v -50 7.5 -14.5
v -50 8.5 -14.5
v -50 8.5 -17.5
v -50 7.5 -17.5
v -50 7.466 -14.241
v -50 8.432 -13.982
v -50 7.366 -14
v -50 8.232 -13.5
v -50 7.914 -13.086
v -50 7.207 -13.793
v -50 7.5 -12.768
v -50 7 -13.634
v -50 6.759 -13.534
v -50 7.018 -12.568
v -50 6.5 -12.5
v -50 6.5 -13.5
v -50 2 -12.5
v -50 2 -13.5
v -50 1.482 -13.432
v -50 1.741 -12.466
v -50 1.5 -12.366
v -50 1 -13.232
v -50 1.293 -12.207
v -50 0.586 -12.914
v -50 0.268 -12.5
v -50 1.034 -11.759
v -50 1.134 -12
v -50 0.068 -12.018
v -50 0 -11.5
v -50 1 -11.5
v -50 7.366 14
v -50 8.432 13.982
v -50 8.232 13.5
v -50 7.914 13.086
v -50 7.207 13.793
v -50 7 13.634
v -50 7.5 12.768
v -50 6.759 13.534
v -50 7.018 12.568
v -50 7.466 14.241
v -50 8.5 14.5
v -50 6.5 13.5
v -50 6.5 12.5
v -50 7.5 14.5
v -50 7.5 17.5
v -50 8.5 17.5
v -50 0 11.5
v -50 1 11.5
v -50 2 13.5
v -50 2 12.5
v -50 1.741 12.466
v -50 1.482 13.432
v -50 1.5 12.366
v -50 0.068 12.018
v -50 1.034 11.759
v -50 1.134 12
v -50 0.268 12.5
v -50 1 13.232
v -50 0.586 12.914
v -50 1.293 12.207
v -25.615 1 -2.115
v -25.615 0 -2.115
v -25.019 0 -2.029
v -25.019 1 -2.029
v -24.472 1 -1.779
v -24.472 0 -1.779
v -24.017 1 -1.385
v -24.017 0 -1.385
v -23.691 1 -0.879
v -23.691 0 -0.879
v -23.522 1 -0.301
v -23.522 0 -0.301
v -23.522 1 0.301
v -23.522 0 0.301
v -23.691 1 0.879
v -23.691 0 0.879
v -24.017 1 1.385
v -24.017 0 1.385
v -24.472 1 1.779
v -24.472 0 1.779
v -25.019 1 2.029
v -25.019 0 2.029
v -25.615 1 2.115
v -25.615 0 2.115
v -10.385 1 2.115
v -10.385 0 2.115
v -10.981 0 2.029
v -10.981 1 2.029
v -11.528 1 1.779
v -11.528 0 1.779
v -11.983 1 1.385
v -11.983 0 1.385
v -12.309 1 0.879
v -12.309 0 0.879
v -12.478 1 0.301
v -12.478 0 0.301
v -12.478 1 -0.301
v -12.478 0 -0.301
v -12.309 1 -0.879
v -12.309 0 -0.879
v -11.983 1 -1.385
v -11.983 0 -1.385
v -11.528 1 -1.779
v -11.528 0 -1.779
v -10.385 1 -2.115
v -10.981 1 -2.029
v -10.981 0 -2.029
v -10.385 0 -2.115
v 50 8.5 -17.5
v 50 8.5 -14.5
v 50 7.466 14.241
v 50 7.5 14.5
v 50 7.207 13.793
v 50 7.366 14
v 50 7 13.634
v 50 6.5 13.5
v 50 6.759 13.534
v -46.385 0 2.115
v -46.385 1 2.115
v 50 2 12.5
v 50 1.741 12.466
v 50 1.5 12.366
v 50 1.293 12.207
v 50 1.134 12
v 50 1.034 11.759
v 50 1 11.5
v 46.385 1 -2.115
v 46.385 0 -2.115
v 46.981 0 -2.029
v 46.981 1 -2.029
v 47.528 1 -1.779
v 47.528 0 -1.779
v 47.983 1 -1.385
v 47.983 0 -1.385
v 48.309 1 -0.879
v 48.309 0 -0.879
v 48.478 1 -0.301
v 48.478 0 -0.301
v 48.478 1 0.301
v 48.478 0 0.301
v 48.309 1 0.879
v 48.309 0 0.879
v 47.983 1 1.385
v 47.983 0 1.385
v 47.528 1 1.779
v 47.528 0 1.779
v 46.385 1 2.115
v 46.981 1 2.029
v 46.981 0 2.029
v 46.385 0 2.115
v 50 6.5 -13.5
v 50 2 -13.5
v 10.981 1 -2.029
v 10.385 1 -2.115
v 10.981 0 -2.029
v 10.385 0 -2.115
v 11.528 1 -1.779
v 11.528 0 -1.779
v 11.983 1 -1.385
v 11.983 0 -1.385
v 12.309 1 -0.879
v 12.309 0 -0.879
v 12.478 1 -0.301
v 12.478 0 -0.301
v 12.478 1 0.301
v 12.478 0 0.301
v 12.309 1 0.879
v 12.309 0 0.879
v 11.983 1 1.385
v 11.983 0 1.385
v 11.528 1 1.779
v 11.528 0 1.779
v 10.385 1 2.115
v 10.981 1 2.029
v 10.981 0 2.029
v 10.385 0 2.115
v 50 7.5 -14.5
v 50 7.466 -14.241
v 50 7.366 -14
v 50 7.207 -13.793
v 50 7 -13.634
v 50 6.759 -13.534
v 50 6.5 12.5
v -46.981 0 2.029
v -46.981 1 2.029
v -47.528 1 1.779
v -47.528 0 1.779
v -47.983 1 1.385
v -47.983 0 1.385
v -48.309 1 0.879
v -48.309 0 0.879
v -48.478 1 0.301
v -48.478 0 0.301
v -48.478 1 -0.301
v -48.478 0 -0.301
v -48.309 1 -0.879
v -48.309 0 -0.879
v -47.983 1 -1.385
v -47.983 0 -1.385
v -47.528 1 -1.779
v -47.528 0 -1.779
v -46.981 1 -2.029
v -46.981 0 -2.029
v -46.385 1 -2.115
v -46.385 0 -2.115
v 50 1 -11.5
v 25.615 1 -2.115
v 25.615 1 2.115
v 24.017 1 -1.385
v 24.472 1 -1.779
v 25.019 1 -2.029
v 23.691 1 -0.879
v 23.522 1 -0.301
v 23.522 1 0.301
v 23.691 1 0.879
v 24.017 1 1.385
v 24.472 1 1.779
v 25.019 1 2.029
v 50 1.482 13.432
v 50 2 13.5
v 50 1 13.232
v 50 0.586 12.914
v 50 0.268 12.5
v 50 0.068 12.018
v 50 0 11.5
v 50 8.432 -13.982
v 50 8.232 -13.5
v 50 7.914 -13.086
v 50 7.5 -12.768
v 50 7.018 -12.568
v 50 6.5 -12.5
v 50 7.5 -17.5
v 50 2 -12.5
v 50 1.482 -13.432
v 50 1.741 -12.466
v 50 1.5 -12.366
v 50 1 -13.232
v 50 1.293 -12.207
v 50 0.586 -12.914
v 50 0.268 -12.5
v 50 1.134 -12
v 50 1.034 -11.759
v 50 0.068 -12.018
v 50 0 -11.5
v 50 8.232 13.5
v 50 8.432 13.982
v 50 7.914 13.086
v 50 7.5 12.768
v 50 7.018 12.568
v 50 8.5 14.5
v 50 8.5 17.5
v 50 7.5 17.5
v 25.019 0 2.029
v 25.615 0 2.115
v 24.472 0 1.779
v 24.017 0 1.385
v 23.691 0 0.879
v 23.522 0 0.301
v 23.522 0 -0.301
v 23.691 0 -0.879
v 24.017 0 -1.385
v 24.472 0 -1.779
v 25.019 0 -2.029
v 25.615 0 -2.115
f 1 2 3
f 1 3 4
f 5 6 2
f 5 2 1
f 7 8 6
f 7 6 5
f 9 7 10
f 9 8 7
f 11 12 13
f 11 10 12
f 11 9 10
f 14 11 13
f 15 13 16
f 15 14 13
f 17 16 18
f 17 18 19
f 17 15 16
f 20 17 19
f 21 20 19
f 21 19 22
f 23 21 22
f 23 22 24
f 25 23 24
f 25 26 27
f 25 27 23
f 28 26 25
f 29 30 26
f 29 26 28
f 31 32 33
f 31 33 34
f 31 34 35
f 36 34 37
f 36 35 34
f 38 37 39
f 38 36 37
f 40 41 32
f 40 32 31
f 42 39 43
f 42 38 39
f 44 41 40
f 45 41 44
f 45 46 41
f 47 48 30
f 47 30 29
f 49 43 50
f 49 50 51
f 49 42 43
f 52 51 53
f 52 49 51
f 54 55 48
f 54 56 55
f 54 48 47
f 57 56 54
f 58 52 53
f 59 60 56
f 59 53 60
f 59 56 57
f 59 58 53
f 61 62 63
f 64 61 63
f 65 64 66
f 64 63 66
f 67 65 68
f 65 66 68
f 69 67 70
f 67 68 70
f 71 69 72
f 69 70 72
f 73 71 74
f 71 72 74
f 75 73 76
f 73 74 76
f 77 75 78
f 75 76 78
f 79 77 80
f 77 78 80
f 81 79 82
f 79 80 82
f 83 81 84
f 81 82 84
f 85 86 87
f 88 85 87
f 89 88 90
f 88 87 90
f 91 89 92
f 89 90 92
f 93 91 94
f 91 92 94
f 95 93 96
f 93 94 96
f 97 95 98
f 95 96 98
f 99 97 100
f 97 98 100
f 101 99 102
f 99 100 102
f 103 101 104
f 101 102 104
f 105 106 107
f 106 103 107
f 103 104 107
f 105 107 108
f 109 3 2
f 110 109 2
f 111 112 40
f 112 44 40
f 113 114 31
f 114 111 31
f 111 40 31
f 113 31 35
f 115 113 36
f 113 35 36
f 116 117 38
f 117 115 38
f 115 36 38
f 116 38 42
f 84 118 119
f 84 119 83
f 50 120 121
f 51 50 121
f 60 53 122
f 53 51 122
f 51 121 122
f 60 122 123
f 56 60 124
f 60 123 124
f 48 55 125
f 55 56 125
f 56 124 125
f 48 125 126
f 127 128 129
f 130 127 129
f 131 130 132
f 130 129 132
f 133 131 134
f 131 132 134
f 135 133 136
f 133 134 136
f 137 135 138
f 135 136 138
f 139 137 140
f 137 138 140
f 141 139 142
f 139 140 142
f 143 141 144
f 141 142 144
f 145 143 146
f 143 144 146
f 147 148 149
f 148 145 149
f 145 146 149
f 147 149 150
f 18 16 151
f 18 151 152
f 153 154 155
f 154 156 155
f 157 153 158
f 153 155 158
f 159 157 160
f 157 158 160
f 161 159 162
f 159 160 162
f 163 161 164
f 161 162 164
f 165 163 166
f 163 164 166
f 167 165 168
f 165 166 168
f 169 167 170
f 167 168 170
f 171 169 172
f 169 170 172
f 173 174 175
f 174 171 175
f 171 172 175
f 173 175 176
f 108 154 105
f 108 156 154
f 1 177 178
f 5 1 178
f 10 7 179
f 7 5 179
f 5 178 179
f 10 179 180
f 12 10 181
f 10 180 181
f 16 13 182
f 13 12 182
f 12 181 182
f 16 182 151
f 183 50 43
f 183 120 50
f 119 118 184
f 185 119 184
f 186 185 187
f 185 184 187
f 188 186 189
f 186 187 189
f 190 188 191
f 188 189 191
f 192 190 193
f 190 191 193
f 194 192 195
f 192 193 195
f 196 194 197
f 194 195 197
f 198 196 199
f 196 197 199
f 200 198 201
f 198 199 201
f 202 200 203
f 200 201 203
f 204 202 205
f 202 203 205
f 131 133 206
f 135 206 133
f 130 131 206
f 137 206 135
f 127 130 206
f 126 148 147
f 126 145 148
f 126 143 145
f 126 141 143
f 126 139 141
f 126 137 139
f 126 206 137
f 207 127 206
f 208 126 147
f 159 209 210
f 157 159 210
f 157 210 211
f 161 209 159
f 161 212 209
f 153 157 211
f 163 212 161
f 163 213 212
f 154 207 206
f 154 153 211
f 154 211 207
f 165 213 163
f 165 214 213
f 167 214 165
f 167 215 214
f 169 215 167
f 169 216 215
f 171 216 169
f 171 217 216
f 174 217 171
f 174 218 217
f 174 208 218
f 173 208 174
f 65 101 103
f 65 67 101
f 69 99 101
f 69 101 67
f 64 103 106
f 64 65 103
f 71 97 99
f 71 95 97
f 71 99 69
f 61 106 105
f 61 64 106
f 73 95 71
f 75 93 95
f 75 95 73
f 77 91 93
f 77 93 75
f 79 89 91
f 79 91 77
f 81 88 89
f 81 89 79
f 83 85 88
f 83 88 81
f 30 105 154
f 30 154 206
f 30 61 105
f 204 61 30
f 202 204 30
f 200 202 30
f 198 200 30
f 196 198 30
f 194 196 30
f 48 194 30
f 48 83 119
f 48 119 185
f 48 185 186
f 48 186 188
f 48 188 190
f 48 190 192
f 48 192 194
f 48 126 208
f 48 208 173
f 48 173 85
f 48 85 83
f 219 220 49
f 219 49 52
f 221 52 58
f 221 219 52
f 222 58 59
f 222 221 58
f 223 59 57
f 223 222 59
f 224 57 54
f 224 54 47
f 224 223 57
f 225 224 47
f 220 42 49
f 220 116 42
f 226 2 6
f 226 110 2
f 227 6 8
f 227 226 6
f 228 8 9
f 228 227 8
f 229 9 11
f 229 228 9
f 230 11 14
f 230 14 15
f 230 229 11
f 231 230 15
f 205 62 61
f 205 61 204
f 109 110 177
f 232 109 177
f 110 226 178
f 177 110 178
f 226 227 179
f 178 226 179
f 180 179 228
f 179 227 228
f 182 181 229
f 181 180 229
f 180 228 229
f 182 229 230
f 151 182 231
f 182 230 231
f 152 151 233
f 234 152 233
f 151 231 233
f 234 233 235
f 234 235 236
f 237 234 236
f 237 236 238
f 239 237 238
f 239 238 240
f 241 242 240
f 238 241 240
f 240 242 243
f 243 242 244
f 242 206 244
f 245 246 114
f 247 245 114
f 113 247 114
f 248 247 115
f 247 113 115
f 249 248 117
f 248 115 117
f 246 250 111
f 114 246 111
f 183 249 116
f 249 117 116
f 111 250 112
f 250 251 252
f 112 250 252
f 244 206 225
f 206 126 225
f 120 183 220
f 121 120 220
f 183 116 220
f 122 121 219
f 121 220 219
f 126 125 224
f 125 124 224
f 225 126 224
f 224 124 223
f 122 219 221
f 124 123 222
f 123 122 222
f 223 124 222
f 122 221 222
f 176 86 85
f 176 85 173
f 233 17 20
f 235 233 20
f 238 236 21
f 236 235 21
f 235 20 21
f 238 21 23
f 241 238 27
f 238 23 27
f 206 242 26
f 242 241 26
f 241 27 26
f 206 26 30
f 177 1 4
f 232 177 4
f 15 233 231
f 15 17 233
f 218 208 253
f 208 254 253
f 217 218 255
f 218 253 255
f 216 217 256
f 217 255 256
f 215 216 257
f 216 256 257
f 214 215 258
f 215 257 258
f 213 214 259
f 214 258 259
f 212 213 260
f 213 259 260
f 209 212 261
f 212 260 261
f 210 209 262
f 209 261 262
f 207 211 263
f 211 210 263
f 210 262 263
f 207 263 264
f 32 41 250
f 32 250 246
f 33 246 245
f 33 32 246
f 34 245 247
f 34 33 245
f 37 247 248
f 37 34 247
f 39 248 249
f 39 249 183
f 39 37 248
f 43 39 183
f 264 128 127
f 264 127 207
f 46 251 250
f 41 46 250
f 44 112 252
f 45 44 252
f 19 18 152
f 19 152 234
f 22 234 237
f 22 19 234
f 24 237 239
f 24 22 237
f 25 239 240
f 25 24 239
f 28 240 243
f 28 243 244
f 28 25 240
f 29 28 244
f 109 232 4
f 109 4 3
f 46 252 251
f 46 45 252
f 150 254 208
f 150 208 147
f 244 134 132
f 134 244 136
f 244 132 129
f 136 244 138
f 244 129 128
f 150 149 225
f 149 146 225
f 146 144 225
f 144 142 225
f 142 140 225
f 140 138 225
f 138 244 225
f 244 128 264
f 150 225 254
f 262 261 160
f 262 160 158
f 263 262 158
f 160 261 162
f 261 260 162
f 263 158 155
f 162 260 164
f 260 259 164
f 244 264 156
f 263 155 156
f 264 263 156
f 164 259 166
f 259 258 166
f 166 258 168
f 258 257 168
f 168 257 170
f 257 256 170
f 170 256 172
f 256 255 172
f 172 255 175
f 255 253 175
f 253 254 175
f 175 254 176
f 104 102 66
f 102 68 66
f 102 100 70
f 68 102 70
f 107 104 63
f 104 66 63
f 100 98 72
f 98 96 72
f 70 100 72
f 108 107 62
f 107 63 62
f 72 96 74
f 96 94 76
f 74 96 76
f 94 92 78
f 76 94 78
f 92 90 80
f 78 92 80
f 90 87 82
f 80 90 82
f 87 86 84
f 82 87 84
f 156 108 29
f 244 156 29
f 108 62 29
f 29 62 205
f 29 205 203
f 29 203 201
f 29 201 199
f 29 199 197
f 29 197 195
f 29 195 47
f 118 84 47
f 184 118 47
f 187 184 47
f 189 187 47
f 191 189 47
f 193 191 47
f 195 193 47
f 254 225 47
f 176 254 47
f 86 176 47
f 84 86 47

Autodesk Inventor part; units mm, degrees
ref_plane "YZ Plane" through (0, 0, 0) normal (1, 0, 0) x (0, 1, 0)
ref_plane "XZ Plane" through (0, 0, 0) normal (0, 1, 0) x (-1, 0, 0)
ref_plane "XY Plane" through (0, 0, 0) normal (0, 0, 1) x (1, 0, 0)
sketch "Base Pattern" plane through (0, 0, 0) normal (0, 1, 0) x (-1, 0, 0)
  line L0 (50, 13.5) -> (-50, 13.5)
  line L1 (-50, 13.5) -> (-50, -13.5)
  line L2 (-50, -13.5) -> (50, -13.5)
  line L3 (50, -13.5) -> (50, 13.5)
  line L4 (50, 13.5) -> (-50, -13.5) construction
  line L5 (-50, 13.5) -> (50, -13.5) construction
  point P0 (0, 0)
  dimension "Length" = 100
  dimension "Base_Width" = 27
sketch "Slot Pattern Set-Out" plane through (0, 0, 0) normal (0, 1, 0) x (-1, 0, 0)
  line L0 (0, -25) -> (0, 25)
  line L1 (10.385, 2.115) -> (-10.385, 2.115)
  line L2 (-10.385, -2.115) -> (10.385, -2.115)
  arc A0 (10.385, -2.115) -> (10.385, 2.115) centre (10.385, 0) ccw
  arc A1 (-10.385, 2.115) -> (-10.385, -2.115) centre (-10.385, 0) ccw
  line L3 (32, 0) -> (-32, 0) construction
  line L4 (10.385, 0) -> (-10.385, 0) construction
  point P0 (0, 0)
  point P1 (0, 0)
  point P2 (0, 0)
  point P3 (0, 0)
  dimension "Slot_Length" = 20.77
  dimension "Slot_Dia" = 4.23
  dimension "Pattern_Length" = 64
extrude "Plate1" add sketch "Base Pattern" along normal blind 1
sketch "Sketch3" plane through (-50, 0, -12.5) normal (0, 0, -1) x (-1, 0, 0)
  line L0 (-100, 0) -> (0, 0)
  line L1 (0, 0) -> (0, 7.5)
  line L2 (0, 7.5) -> (-100, 7.5)
  line L3 (-100, 7.5) -> (-100, 0)
edge flange "Flange Side" height 7.5 angle 90 thickness 1 bend radius 1 thickness toward (0, 0, -1) relief tear relief width 1 relief depth 0.5 corner gap 1 corner form 0 edges at (0, 1, -13.5) (0, 1, 13.5) wall of the first edge with corners at (50, 0, -12.5) (-50, 0, -12.5) (-50, 7.5, -12.5) (50, 7.5, -12.5)
bend "Bend1"
corner "Corner1"
sketch "Sketch4" plane through (-50, 7.5, 13.5) normal (0, 1, 0) x (-1, 0, 0)
  line L0 (-100, 0) -> (0, 0)
  line L1 (0, 0) -> (0, 4)
  line L2 (0, 4) -> (-100, 4)
  line L3 (-100, 4) -> (-100, 0)
edge flange "Flange Nib" height 5 angle 90 thickness 1 bend radius 1 thickness toward (0, 1, 0) relief tear relief width 1 relief depth 0.5 corner gap 1 corner form 0 edges at (0, 7.5, 13.5) (0, 7.5, -13.5) wall of the first edge with corners at (50, 7.5, 13.5) (-50, 7.5, 13.5) (-50, 7.5, 17.5) (50, 7.5, 17.5)
bend "Bend2"
corner "Corner2"
extrude "Slot Cut-Out" cut sketch "Slot Pattern Set-Out" along normal blind 1
pattern_linear "Slot Pattern" count 2 spacing 36 along (1, 0, 0) of "Slot Cut-Out"
mirror "Slot Patern Mirror" about plane through (0, 0, 0) normal (1, 0, 0) of "Slot Cut-Out", "Slot Pattern"
equation "\"Slot_Length\" = Slot_Length_Effective"
equation "\"d28\" = Thickness"
equation "\"d30\" = 0.6 * Slots_Integer"
equation "\"d32\" = Slot_Spacing"
equation "\"d33\" = Thickness"
equation "\"d8\" = BendReliefWidth"
equation "\"d9\" = BendReliefDepth"
equation "\"d10\" = MinimumRemnant"
equation "\"d11\" = BendRadius"
equation "\"d12\" = Flange_Height"
equation "\"d14\" = BendRadius"
equation "\"d15\" = CornerReliefSize"
equation "\"d16\" = GapSize"
equation "\"d17\" = JacobiRadiusSize"
equation "\"d18\" = BendReliefWidth"
equation "\"d19\" = BendReliefDepth"
equation "\"d20\" = MinimumRemnant"
equation "\"d21\" = BendRadius"
equation "\"d22\" = Flange_Nib"
equation "\"d24\" = BendRadius"
equation "\"d25\" = CornerReliefSize"
equation "\"d26\" = GapSize"
equation "\"d27\" = JacobiRadiusSize"
equation "\"BendRadius\" = Thickness"
equation "\"BendReliefWidth\" = Thickness"
equation "\"BendReliefDepth\" = 0.5 * Thickness"
equation "\"CornerReliefSize\" = 4 * Thickness"
equation "\"MinimumRemnant\" = 2 * Thickness"
equation "\"TransitionRadius\" = BendRadius"
equation "\"JacobiRadiusSize\" = BendRadius"
equation "\"GapSize\" = Thickness"
equation "\"Flange_Height\" = 7.5"
equation "\"Slot_Spacing\" = 36"
equation "\"Flange_Nib\" = 5"
equation "\"Slot_Length_Tab\" = 25"
equation "\"Slot_Length_Effective\" = Slot_Length_Tab - Slot_Dia"
equation "\"Thickness\" = 1"
equation "\"Slots_Integer\" = 2.777778"
properties part number "DIN Rail (TS) 35mm Wide v1-01" material "Steel"
